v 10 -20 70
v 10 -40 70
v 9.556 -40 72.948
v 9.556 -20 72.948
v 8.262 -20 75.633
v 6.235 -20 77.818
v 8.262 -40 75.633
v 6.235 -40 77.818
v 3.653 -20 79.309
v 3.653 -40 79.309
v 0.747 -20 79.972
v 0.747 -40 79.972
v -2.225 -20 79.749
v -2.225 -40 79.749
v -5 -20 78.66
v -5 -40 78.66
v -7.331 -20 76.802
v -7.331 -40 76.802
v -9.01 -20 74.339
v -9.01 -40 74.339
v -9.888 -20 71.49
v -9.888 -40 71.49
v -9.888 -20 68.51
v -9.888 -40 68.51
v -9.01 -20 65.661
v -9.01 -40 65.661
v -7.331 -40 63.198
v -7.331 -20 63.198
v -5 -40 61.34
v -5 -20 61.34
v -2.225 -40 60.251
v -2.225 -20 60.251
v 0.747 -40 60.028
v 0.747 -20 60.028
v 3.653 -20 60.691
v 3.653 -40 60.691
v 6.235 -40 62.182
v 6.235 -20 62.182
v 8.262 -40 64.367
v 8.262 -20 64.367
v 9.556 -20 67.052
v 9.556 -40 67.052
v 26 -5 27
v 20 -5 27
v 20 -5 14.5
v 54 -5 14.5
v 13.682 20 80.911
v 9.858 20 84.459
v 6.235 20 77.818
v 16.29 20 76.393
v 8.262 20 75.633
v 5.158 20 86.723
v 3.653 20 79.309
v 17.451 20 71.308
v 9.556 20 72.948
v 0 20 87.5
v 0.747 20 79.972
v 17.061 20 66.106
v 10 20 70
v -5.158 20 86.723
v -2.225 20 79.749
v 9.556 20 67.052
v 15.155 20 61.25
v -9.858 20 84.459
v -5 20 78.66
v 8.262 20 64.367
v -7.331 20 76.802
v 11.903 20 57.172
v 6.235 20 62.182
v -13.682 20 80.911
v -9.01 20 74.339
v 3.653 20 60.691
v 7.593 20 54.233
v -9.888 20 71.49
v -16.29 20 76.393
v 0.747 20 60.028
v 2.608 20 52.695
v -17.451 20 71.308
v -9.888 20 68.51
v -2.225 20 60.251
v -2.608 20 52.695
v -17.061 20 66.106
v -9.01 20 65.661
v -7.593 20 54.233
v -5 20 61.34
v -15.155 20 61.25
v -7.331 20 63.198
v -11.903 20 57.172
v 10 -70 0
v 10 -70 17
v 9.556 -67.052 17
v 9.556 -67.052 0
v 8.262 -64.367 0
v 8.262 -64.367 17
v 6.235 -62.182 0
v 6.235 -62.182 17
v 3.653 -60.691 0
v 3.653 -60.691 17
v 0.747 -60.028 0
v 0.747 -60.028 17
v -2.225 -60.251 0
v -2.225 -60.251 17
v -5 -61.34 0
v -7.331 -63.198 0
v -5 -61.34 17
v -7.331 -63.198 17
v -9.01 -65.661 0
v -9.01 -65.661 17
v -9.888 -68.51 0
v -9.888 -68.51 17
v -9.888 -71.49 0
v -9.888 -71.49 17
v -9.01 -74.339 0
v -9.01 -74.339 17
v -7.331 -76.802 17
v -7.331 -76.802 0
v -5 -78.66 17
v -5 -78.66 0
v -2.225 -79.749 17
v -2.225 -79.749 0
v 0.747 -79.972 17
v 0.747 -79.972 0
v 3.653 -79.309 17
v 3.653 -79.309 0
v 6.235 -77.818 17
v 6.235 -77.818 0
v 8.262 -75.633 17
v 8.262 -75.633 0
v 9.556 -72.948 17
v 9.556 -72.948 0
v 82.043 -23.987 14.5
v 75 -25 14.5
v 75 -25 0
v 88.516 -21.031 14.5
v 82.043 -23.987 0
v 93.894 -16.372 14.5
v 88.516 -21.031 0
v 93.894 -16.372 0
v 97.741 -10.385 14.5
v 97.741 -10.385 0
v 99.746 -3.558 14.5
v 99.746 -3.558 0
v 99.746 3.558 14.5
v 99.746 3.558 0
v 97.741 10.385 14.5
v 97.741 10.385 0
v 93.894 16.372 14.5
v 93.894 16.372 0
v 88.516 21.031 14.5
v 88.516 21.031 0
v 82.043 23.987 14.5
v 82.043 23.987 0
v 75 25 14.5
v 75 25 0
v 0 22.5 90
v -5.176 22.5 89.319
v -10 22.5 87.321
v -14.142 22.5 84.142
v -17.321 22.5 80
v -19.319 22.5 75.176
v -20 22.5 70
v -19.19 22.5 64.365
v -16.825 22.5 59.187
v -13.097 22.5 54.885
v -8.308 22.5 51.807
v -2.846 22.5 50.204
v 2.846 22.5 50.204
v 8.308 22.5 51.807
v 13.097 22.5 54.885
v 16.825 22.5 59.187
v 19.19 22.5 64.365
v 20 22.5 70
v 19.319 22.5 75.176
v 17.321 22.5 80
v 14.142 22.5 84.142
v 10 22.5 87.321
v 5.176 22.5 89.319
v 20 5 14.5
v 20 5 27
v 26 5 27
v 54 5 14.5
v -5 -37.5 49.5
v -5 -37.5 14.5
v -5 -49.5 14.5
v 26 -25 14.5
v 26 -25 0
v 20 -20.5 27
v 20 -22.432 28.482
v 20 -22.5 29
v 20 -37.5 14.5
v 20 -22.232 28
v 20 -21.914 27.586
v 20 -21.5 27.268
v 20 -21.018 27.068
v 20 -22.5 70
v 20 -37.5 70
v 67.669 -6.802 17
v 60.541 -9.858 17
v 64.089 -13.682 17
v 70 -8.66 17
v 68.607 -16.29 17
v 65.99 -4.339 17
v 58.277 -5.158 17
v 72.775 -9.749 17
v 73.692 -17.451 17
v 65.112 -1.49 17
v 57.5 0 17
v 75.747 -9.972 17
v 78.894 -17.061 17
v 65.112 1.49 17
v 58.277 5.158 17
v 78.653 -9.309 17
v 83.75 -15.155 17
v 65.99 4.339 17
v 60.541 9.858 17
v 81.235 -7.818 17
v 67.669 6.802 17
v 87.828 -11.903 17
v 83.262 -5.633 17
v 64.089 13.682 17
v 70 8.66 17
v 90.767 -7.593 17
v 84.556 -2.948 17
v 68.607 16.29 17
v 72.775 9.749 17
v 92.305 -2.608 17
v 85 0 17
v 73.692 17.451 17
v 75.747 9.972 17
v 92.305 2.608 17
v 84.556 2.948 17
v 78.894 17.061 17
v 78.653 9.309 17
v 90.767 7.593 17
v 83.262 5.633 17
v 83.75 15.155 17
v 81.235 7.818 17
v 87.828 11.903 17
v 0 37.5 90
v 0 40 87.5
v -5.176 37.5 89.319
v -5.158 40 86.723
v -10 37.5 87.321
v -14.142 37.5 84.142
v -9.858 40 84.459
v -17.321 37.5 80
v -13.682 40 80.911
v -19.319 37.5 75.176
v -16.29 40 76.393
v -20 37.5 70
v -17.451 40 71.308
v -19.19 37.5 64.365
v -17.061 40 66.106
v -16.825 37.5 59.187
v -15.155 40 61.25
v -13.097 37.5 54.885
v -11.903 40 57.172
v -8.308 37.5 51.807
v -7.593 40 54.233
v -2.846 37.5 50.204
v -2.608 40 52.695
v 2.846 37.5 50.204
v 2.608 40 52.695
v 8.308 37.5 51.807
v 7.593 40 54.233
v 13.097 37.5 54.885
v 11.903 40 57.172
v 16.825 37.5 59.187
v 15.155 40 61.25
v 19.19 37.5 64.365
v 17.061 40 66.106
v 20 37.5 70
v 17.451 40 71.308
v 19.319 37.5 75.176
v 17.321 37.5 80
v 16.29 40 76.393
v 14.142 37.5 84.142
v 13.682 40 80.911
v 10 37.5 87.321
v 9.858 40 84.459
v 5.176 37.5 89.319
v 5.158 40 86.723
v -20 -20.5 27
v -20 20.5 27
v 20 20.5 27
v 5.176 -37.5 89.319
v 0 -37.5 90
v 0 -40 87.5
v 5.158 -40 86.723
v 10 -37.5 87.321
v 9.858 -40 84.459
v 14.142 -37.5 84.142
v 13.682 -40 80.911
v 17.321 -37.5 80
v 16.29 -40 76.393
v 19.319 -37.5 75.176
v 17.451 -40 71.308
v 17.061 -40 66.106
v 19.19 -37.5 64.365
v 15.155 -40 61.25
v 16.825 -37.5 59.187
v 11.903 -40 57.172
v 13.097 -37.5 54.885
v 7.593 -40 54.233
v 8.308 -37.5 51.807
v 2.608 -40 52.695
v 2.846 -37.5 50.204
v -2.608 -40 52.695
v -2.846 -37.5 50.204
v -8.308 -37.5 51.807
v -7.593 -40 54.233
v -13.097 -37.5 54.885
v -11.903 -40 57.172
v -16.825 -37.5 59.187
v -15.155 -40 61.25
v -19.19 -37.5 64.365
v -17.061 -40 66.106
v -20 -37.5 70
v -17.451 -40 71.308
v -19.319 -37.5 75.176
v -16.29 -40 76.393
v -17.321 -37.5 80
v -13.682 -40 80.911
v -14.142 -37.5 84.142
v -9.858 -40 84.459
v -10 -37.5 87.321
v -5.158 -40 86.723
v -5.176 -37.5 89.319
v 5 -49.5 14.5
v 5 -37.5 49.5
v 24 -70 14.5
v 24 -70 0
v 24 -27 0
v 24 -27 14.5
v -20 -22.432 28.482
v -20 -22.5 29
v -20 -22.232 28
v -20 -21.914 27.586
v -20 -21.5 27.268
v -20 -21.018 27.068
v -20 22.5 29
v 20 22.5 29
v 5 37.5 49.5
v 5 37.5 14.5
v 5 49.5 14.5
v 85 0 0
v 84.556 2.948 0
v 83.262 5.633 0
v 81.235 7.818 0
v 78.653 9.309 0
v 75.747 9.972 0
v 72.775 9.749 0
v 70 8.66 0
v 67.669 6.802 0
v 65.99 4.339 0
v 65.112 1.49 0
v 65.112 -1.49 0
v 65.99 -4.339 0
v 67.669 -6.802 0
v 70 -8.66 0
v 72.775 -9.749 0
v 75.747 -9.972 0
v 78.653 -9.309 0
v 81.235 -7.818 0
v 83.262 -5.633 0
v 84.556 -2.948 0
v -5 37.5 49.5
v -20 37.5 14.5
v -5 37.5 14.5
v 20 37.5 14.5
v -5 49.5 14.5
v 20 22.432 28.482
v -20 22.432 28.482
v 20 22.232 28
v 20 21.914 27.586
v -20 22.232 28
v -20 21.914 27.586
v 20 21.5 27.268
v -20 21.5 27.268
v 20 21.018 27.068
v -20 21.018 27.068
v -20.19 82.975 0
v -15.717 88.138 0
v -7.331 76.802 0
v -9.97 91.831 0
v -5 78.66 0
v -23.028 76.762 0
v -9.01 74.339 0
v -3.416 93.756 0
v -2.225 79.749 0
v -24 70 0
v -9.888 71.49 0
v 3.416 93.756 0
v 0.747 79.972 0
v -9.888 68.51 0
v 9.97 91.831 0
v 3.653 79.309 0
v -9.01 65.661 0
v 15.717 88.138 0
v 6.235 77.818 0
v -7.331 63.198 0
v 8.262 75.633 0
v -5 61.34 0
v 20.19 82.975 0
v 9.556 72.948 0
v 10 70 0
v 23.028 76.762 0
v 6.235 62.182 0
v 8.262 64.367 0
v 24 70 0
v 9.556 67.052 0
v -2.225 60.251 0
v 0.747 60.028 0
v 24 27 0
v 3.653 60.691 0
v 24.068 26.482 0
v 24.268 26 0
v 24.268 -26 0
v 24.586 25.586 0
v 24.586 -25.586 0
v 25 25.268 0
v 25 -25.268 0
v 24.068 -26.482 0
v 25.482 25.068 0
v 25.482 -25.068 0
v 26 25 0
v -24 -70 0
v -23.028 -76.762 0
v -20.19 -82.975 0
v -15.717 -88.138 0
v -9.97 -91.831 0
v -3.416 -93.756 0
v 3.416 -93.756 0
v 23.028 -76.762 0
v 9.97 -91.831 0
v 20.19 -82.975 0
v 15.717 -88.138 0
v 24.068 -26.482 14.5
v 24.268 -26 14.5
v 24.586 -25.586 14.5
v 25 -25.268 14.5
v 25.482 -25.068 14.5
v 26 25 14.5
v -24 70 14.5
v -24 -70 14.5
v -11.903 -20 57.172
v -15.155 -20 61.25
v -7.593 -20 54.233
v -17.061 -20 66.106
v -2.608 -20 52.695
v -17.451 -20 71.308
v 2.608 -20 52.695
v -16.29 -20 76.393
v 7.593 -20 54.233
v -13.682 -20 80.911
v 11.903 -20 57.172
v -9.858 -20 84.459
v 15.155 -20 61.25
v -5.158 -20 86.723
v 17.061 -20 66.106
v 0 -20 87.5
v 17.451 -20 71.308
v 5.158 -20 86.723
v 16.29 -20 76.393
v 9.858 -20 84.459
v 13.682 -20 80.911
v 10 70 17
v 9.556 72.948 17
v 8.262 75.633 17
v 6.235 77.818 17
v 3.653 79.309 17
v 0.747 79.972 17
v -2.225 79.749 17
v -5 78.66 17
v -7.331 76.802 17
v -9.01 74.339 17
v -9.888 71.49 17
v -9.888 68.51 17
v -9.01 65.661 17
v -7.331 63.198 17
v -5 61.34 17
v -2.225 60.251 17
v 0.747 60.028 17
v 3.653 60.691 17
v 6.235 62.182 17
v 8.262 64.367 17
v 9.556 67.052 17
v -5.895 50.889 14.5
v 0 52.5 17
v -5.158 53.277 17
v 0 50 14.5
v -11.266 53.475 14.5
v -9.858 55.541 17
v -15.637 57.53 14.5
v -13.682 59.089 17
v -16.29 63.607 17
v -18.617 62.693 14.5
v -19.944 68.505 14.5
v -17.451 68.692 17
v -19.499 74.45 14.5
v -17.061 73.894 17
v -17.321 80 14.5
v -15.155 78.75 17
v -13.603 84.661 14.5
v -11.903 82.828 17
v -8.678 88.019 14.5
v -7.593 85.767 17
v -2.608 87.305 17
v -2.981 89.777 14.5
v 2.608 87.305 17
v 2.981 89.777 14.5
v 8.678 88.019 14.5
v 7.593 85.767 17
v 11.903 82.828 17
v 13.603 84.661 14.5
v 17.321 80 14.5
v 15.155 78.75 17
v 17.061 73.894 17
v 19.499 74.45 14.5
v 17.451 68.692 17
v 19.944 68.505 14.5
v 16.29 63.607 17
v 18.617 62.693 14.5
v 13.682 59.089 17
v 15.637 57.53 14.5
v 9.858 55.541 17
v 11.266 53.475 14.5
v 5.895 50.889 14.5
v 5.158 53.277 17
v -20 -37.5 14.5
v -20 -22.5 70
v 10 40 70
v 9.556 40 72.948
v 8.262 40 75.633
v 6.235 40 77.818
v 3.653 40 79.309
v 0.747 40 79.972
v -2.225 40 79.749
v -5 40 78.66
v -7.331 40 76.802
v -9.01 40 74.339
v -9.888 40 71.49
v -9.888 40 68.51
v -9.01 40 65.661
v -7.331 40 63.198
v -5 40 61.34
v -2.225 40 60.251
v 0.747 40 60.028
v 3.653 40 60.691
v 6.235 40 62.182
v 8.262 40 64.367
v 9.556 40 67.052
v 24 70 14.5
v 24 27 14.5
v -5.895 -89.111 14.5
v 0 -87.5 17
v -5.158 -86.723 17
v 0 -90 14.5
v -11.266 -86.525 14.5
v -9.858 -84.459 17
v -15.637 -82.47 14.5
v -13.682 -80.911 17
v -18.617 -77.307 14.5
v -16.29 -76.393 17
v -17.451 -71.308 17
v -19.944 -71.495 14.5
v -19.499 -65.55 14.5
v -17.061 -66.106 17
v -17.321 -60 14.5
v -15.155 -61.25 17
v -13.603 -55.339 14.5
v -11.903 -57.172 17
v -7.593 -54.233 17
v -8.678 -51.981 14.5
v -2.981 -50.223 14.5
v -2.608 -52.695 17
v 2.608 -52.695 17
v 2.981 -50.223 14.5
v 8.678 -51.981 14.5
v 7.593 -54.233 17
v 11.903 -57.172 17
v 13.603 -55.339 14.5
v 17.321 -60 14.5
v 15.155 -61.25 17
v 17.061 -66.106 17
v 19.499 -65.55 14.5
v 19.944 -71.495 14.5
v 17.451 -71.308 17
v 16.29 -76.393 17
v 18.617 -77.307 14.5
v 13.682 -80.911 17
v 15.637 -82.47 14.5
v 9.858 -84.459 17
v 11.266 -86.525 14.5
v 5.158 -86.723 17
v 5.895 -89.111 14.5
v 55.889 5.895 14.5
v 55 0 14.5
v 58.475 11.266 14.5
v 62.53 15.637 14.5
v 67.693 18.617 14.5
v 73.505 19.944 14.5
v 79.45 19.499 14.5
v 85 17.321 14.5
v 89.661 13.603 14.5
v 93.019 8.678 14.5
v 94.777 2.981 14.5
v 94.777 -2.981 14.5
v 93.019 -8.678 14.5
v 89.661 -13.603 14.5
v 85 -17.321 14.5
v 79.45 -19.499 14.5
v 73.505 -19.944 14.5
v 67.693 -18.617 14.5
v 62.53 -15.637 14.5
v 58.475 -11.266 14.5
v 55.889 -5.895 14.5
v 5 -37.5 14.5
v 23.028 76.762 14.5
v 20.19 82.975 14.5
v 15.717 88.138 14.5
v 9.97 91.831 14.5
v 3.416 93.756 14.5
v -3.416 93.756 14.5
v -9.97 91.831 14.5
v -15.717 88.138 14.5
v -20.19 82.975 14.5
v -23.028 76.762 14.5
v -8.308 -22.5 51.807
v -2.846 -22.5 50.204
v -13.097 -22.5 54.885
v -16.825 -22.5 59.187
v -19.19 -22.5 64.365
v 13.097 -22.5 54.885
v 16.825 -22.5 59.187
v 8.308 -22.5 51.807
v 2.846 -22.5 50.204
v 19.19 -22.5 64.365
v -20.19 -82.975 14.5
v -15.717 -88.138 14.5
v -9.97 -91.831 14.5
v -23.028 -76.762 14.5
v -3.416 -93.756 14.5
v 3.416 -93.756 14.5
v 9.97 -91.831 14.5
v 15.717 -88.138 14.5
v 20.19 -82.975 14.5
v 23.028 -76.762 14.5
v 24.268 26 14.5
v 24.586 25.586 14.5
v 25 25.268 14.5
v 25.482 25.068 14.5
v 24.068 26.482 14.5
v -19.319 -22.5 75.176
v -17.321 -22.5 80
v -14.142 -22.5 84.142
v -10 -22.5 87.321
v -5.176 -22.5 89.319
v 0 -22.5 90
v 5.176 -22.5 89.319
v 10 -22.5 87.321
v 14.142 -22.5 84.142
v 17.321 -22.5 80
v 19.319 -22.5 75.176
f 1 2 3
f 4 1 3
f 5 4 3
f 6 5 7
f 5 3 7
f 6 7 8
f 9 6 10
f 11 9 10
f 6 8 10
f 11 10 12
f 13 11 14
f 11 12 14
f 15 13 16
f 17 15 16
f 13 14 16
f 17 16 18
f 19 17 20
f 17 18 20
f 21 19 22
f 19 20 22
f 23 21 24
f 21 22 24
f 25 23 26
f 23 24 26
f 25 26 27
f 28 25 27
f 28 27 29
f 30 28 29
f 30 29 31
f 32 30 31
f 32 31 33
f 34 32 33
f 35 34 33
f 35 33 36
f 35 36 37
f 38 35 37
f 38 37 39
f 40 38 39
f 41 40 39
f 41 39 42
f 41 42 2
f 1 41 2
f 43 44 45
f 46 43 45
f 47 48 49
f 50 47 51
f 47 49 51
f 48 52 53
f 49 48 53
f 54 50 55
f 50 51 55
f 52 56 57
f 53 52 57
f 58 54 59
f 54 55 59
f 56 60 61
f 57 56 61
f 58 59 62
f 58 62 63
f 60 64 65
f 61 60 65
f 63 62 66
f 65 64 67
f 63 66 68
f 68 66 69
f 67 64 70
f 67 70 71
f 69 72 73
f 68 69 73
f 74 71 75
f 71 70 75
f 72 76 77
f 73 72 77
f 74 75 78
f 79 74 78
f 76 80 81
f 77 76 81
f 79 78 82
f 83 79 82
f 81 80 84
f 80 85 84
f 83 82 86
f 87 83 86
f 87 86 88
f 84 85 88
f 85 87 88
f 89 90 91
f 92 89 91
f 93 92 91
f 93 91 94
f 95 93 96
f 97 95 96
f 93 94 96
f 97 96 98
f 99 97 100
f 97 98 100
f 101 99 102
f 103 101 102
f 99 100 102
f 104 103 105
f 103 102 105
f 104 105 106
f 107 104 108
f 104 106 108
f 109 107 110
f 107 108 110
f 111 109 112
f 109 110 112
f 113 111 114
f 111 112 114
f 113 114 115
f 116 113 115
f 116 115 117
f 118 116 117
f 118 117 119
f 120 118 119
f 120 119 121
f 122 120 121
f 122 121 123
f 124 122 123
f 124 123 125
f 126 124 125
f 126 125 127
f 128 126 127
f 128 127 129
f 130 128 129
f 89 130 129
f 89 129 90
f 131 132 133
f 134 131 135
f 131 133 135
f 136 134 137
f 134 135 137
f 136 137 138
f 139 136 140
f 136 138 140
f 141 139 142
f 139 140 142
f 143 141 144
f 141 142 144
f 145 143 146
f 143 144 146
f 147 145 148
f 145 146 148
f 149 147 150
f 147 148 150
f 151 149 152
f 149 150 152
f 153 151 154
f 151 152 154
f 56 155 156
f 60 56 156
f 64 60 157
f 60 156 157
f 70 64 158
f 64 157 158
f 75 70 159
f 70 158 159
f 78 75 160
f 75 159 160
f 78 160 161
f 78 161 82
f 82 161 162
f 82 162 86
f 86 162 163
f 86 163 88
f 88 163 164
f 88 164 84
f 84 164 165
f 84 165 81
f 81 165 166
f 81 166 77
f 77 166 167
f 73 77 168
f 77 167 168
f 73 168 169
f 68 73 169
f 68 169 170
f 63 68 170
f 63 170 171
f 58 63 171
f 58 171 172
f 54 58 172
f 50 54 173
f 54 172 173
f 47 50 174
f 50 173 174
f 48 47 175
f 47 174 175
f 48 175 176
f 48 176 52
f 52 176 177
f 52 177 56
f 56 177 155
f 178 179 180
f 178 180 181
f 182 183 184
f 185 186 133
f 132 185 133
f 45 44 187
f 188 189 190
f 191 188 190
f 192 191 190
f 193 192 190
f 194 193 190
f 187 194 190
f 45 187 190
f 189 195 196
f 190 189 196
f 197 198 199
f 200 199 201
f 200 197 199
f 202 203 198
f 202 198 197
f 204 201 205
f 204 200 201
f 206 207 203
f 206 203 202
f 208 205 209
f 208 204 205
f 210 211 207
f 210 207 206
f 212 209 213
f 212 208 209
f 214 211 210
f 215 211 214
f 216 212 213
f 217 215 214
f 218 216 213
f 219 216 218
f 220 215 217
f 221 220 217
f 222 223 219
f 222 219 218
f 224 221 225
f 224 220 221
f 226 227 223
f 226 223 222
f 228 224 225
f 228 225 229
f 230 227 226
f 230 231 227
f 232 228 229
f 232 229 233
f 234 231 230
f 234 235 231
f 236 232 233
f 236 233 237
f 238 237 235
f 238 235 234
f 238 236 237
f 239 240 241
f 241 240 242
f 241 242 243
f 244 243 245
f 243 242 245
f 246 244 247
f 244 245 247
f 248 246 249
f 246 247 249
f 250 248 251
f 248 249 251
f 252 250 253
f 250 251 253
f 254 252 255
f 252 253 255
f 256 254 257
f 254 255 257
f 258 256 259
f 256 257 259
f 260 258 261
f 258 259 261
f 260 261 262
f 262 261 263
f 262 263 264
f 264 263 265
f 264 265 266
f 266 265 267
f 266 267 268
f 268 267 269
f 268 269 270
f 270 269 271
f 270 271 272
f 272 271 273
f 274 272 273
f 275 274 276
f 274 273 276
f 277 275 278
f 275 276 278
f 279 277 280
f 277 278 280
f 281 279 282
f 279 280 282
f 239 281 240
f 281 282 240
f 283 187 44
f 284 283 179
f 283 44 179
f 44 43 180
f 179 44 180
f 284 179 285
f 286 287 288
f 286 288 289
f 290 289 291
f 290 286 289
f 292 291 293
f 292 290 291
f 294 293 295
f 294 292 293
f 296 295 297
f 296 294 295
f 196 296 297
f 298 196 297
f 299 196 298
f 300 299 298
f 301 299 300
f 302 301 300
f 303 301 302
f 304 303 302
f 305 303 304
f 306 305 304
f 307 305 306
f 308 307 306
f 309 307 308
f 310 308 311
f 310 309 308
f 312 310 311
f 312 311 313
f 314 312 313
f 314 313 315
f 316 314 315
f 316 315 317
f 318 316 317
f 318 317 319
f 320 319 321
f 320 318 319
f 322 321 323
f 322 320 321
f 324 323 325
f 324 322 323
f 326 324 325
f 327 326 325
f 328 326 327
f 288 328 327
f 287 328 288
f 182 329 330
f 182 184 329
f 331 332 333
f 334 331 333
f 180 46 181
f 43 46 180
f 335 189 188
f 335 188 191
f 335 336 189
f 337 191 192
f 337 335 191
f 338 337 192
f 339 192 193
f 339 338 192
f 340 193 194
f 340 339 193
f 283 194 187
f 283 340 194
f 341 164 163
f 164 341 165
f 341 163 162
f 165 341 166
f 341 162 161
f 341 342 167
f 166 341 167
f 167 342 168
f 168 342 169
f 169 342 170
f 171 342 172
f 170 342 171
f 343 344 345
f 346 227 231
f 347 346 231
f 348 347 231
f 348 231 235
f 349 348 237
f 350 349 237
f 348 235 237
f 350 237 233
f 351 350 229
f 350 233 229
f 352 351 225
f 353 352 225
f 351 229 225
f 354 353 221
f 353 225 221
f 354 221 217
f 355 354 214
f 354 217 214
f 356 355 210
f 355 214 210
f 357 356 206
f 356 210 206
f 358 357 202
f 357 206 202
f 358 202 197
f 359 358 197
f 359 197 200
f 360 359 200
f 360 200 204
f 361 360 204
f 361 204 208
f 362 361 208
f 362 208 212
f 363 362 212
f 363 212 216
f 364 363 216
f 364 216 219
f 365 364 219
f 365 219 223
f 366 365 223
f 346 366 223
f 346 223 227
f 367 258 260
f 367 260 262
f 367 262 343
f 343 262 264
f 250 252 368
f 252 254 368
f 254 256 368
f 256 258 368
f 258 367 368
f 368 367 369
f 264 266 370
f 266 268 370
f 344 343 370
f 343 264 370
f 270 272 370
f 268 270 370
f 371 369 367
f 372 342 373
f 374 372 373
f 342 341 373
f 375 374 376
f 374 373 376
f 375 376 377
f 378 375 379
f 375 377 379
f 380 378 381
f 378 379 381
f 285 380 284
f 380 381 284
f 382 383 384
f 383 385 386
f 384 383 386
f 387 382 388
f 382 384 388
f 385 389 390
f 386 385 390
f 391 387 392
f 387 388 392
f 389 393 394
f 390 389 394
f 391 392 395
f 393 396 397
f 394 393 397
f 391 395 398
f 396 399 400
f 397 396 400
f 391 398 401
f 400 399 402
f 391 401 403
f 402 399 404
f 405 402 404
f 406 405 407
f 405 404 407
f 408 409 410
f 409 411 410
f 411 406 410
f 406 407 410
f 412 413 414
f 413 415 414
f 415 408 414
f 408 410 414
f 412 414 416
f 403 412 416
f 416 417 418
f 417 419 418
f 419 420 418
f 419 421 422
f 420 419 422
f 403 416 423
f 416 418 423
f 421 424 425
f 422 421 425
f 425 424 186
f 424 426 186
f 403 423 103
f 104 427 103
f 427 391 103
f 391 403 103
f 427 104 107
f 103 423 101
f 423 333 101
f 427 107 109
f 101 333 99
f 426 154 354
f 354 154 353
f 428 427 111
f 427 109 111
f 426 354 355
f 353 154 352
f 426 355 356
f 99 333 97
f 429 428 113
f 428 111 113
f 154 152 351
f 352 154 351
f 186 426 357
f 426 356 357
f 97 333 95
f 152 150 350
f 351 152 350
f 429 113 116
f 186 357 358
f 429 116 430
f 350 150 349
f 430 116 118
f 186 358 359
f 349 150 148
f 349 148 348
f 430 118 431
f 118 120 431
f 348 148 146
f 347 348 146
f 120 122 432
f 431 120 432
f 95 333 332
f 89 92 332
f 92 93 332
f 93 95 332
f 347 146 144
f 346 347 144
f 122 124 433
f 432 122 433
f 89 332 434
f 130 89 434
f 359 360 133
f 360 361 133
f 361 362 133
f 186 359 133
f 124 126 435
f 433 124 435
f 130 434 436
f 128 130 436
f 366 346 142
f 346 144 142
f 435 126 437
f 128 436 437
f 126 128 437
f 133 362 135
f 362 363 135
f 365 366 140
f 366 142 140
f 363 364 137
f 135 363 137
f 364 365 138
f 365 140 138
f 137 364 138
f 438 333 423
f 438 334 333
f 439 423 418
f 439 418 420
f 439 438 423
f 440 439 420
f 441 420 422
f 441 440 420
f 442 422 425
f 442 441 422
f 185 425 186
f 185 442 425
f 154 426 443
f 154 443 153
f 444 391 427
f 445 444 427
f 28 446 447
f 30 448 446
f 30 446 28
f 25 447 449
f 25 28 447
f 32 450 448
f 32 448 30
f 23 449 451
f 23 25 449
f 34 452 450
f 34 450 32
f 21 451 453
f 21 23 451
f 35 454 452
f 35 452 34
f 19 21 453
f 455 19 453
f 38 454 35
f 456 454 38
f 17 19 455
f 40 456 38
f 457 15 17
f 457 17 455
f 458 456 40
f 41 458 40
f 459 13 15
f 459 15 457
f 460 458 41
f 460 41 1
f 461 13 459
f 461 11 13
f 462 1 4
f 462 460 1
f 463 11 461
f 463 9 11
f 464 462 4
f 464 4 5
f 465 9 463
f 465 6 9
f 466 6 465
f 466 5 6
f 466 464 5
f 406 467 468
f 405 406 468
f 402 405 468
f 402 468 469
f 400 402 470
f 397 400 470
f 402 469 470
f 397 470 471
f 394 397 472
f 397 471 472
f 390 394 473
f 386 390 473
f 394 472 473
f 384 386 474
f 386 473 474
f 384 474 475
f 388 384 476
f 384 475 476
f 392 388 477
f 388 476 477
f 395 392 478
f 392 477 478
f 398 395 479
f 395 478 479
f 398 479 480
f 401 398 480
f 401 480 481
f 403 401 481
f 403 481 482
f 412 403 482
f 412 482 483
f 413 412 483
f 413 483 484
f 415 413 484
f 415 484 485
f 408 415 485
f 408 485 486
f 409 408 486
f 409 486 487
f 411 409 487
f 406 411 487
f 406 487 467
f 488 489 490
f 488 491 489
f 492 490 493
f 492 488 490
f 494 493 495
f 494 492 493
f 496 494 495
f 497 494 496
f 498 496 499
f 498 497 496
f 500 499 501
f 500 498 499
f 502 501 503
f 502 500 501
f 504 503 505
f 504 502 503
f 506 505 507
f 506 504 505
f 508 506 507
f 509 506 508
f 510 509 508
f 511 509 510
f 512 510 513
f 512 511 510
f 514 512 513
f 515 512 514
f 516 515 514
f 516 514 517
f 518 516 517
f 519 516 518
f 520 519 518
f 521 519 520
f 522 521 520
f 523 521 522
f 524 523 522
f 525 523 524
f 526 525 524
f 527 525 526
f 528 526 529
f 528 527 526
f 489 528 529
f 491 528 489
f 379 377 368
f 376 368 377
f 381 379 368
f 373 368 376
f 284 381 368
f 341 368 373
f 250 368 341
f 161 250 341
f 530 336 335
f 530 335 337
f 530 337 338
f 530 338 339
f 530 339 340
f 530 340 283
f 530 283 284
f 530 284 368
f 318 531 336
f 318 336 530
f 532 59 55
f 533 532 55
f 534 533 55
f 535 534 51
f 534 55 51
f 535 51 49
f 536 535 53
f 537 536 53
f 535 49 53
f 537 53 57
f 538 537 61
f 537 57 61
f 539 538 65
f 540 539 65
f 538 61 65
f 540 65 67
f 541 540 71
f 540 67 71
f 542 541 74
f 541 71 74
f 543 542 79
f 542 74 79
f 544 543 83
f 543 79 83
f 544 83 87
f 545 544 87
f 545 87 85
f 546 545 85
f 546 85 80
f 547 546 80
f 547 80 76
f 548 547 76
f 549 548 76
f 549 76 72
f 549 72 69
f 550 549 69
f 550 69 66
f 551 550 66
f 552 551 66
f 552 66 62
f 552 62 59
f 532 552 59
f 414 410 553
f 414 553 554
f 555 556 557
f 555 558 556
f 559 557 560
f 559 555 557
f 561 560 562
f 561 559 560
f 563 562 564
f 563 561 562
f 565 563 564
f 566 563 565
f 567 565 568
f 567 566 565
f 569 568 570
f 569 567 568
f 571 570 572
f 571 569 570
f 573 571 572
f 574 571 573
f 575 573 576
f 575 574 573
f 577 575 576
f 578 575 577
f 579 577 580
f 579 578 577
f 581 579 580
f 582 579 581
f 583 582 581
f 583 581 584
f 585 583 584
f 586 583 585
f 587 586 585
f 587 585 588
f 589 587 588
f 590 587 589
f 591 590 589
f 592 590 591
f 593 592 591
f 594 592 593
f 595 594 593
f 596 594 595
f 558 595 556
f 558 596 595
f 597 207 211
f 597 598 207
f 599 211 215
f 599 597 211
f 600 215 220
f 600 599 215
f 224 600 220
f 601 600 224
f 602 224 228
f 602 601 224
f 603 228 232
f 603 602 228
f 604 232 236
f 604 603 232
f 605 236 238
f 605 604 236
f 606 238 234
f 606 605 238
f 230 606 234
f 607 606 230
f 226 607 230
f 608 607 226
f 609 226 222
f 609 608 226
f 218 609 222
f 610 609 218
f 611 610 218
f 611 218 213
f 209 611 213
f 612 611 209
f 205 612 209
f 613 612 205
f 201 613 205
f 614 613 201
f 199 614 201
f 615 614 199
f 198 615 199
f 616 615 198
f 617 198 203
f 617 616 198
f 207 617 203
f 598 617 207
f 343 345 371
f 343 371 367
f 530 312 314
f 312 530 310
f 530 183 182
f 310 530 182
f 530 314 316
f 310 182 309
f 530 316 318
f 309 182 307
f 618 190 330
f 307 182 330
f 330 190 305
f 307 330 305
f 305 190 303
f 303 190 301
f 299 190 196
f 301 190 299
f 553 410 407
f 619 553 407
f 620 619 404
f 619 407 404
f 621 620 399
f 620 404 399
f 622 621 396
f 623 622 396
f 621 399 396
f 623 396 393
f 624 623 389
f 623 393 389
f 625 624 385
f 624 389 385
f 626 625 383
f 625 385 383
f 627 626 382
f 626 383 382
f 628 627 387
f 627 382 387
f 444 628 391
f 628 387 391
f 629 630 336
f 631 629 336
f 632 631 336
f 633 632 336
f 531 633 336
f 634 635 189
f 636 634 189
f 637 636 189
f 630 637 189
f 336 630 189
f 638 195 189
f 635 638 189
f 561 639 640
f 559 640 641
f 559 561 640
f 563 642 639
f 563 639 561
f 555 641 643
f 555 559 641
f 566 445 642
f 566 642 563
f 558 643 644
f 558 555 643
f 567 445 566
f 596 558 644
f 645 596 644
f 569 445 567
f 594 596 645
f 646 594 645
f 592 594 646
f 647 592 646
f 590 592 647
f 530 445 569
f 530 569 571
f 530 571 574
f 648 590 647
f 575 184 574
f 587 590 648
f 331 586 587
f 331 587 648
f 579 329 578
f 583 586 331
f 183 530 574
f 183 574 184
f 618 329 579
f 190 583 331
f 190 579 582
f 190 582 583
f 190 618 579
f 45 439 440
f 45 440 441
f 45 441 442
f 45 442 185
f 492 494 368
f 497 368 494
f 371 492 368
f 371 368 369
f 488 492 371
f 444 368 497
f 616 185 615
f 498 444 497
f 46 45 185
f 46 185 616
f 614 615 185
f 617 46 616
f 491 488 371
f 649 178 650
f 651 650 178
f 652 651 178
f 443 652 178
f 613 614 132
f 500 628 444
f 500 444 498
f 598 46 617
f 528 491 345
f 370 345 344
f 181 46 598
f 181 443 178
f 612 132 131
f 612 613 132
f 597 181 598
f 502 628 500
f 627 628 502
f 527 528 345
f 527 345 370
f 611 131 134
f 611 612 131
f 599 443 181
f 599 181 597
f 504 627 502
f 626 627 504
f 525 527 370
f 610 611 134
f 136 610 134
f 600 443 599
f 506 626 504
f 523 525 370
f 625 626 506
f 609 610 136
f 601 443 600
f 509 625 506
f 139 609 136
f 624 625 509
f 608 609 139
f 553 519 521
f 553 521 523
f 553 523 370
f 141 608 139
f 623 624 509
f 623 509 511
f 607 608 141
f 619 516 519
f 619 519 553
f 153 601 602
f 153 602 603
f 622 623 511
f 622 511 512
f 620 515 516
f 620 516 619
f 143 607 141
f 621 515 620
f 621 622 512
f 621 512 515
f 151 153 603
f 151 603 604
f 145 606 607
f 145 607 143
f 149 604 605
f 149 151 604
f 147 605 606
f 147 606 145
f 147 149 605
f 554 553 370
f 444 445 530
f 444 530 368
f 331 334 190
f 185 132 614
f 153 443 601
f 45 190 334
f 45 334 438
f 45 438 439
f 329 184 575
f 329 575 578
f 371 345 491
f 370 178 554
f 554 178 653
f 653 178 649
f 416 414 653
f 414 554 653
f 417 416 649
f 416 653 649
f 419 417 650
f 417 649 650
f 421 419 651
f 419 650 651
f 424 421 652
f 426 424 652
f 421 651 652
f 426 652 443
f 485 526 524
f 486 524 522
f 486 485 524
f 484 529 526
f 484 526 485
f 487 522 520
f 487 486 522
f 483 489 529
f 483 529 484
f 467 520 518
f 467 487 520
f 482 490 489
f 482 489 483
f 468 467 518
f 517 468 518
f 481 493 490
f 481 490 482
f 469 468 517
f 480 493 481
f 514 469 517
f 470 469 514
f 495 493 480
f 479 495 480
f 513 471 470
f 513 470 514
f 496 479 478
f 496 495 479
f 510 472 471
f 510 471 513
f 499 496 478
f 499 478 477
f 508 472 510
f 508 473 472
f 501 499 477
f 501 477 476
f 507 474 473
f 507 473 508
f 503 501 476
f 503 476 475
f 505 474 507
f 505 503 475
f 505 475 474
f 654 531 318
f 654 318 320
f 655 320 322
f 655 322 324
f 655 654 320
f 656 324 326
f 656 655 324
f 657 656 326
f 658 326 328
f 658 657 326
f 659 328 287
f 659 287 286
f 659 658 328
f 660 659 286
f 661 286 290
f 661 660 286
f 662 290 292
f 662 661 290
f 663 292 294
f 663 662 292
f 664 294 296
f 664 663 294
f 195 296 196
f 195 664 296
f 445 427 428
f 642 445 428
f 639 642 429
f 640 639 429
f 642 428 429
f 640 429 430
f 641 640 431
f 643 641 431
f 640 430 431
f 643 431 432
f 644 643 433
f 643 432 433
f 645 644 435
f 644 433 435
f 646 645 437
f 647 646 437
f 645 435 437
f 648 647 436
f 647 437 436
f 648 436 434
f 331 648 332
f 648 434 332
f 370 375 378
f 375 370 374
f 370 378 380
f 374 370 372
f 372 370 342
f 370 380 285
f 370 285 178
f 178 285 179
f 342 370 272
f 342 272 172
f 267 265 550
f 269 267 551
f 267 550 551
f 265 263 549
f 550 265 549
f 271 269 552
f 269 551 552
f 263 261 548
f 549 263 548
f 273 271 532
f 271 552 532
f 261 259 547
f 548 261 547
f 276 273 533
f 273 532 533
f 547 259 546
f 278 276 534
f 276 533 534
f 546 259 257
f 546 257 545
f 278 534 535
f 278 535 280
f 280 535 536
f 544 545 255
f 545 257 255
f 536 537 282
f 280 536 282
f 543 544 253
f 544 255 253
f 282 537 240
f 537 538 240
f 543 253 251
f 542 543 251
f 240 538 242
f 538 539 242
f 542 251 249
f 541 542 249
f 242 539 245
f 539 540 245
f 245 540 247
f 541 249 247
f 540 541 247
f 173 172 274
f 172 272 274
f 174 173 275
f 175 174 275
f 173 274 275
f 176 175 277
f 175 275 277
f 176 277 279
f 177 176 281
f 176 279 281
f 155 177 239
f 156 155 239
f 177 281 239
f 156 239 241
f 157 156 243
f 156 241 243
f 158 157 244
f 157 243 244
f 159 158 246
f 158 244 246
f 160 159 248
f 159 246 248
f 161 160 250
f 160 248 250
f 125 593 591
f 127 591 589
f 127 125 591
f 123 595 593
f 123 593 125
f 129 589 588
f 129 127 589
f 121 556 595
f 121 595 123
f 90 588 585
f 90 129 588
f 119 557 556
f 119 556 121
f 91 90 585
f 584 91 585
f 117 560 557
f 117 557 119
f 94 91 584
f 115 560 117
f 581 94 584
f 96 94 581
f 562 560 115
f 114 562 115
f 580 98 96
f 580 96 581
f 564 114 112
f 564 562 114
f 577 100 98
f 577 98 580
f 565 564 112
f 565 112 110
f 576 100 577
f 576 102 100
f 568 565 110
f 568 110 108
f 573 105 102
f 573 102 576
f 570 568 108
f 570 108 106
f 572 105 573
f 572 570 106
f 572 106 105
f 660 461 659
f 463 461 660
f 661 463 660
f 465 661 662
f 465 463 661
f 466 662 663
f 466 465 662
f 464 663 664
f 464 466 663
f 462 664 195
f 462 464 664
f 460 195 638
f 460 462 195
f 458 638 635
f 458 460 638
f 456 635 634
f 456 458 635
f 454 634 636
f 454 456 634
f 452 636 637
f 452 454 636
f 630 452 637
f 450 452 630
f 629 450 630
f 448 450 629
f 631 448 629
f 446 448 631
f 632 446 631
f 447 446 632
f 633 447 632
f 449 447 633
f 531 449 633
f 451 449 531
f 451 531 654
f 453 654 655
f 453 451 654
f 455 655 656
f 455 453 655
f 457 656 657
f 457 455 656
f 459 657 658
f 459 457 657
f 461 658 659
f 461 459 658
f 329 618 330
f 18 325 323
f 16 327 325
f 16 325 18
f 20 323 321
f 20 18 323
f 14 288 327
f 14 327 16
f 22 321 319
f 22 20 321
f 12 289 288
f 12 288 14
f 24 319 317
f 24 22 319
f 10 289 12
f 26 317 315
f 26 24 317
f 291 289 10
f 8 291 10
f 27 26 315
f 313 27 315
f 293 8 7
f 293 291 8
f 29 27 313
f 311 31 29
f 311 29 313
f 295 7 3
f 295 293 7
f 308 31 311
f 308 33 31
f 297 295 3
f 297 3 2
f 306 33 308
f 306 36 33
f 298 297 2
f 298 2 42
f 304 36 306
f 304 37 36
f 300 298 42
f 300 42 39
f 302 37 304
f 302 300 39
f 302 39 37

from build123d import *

# Parameters (mm, degrees)
PAD002_DEPTH    = 5
PAD001_DEPTH    = 20
PAD003_DEPTH    = 5
PAD_DEPTH       = 14.5
SKETCH009_R     = 10
POCKET_DEPTH    = 134.001
SKETCH010_R     = 10
POCKET001_DEPTH = 17.001
SKETCH011_R     = 10
POCKET002_DEPTH = 17.001
FILLET_R        = 2


with BuildPart() as revolution001:
    # Sketch005 → Revolution001 (revolve)
    with BuildSketch(Plane.YZ):
        Polygon((20, 70), (20, 87.5), (22.5, 90), (37.5, 90), (40, 87.5), (40, 70), align=None)
    revolve(axis=Axis((0, 20, 70), (0, -1, 0)))


with BuildPart() as pad002:
    # Sketch002 → Pad002 (new body, symmetric)
    with BuildSketch(Plane.YZ):
        Polygon((-37.5, 49.5), (-37.5, 14.5), (-49.5, 14.5), align=None)
        Polygon((37.5, 14.5), (49.5, 14.5), (37.5, 49.5), align=None)
    extrude(amount=PAD002_DEPTH, both=True)


with BuildPart() as pad001:
    # Sketch001 → Pad001 (new body, symmetric)
    with BuildSketch(Plane.YZ):
        Polygon((-37.5, 0), (-37.5, 70), (-22.5, 70), (-22.5, 27), (22.5, 27), (22.5, 70), (37.5, 70), (37.5, 0), align=None)
    extrude(amount=PAD001_DEPTH, both=True)


with BuildPart() as revolution004:
    # Sketch008 → Revolution004 (revolve)
    with BuildSketch(Plane.XZ):
        Polygon((55, 14.5), (75, 14.5), (75, 17), (57.5, 17), align=None)
    revolve(axis=Axis((75, 0, 14.5), (0, 0, -1)))


with BuildPart() as pad003:
    # Sketch003 → Pad003 (new body, symmetric)
    with BuildSketch(Plane.XZ):
        Polygon((20, 27), (20, 14.5), (54, 14.5), (26, 27), align=None)
    extrude(amount=PAD003_DEPTH, both=True)


with BuildPart() as revolution003:
    # Sketch007 → Revolution003 (revolve)
    with BuildSketch(Plane.YZ):
        Polygon((50, 14.5), (70, 14.5), (70, 17), (52.5, 17), align=None)
    revolve(axis=Axis((0, 70, 14.5), (0, 0, -1)))


with BuildPart() as revolution002:
    # Sketch006 → Revolution002 (revolve)
    with BuildSketch(Plane.YZ):
        Polygon((-90, 14.5), (-70, 14.5), (-70, 17), (-87.5, 17), align=None)
    revolve(axis=Axis((0, -70, 14.132615), (0, 0, -1)))


with BuildPart() as revolution:
    # Sketch004 → Revolution (revolve)
    with BuildSketch(Plane.YZ):
        Polygon((-40, 70), (-40, 87.5), (-37.5, 90), (-22.5, 90), (-20, 87.5), (-20, 70), align=None)
    revolve(axis=Axis((0, -20, 70), (0, 1, 0)))


with BuildPart() as fillet_body:
    # Sketch → Pad (new body)
    with BuildSketch(Plane.XY):
        with BuildLine():
            Line((-24, 70), (-24, -70.000001))
            ThreePointArc((-24, -70.000001), (1e-06, -94), (24, -70))
            Line((24, -70), (24, -25))
            Line((24, -25), (75, -25))
            ThreePointArc((75, -25), (100, 0), (74.999999, 25))
            Line((24, 25), (74.999999, 25))
            Line((24, 70), (24, 25))
            ThreePointArc((24, 70), (0, 94), (-24, 70))
        make_face()
    extrude(amount=PAD_DEPTH)

    # Fusion: union Revolution001, Pad002, Pad001, Revolution004, Pad003, Revolution003, Revolution002, Revolution
    add(revolution001.part)
    add(pad002.part)
    add(pad001.part)
    add(revolution004.part)
    add(pad003.part)
    add(revolution003.part)
    add(revolution002.part)
    add(revolution.part)

    # Sketch009 → Pocket (cut, through all)
    with BuildSketch(Plane.XZ.offset(40)):
        with Locations((0, 70)):
            Circle(SKETCH009_R)
    extrude(amount=-POCKET_DEPTH, mode=Mode.SUBTRACT)

    # Sketch010 → Pocket001 (cut, through all)
    with BuildSketch(Plane.XY.offset(17)):
        with Locations((0, 70)):
            Circle(SKETCH010_R)
        with Locations((0, -70)):
            Circle(SKETCH010_R)
    extrude(amount=-POCKET001_DEPTH, mode=Mode.SUBTRACT)

    # Sketch011 → Pocket002 (cut, through all)
    with BuildSketch(Plane.XY.offset(17)):
        with Locations((75, 0)):
            Circle(SKETCH011_R)
    extrude(amount=-POCKET002_DEPTH, mode=Mode.SUBTRACT)

    # Fillet
    fillet_edges = [fillet_body.edges().sort_by_distance(p)[0] for p in [
        (0, 22.5, 27),
        (24, -25, 7.25),
        (24, 25, 7.25),
        (0, -22.5, 27),
    ]]
    fillet(fillet_edges, radius=FILLET_R)


solid = fillet_body.part
